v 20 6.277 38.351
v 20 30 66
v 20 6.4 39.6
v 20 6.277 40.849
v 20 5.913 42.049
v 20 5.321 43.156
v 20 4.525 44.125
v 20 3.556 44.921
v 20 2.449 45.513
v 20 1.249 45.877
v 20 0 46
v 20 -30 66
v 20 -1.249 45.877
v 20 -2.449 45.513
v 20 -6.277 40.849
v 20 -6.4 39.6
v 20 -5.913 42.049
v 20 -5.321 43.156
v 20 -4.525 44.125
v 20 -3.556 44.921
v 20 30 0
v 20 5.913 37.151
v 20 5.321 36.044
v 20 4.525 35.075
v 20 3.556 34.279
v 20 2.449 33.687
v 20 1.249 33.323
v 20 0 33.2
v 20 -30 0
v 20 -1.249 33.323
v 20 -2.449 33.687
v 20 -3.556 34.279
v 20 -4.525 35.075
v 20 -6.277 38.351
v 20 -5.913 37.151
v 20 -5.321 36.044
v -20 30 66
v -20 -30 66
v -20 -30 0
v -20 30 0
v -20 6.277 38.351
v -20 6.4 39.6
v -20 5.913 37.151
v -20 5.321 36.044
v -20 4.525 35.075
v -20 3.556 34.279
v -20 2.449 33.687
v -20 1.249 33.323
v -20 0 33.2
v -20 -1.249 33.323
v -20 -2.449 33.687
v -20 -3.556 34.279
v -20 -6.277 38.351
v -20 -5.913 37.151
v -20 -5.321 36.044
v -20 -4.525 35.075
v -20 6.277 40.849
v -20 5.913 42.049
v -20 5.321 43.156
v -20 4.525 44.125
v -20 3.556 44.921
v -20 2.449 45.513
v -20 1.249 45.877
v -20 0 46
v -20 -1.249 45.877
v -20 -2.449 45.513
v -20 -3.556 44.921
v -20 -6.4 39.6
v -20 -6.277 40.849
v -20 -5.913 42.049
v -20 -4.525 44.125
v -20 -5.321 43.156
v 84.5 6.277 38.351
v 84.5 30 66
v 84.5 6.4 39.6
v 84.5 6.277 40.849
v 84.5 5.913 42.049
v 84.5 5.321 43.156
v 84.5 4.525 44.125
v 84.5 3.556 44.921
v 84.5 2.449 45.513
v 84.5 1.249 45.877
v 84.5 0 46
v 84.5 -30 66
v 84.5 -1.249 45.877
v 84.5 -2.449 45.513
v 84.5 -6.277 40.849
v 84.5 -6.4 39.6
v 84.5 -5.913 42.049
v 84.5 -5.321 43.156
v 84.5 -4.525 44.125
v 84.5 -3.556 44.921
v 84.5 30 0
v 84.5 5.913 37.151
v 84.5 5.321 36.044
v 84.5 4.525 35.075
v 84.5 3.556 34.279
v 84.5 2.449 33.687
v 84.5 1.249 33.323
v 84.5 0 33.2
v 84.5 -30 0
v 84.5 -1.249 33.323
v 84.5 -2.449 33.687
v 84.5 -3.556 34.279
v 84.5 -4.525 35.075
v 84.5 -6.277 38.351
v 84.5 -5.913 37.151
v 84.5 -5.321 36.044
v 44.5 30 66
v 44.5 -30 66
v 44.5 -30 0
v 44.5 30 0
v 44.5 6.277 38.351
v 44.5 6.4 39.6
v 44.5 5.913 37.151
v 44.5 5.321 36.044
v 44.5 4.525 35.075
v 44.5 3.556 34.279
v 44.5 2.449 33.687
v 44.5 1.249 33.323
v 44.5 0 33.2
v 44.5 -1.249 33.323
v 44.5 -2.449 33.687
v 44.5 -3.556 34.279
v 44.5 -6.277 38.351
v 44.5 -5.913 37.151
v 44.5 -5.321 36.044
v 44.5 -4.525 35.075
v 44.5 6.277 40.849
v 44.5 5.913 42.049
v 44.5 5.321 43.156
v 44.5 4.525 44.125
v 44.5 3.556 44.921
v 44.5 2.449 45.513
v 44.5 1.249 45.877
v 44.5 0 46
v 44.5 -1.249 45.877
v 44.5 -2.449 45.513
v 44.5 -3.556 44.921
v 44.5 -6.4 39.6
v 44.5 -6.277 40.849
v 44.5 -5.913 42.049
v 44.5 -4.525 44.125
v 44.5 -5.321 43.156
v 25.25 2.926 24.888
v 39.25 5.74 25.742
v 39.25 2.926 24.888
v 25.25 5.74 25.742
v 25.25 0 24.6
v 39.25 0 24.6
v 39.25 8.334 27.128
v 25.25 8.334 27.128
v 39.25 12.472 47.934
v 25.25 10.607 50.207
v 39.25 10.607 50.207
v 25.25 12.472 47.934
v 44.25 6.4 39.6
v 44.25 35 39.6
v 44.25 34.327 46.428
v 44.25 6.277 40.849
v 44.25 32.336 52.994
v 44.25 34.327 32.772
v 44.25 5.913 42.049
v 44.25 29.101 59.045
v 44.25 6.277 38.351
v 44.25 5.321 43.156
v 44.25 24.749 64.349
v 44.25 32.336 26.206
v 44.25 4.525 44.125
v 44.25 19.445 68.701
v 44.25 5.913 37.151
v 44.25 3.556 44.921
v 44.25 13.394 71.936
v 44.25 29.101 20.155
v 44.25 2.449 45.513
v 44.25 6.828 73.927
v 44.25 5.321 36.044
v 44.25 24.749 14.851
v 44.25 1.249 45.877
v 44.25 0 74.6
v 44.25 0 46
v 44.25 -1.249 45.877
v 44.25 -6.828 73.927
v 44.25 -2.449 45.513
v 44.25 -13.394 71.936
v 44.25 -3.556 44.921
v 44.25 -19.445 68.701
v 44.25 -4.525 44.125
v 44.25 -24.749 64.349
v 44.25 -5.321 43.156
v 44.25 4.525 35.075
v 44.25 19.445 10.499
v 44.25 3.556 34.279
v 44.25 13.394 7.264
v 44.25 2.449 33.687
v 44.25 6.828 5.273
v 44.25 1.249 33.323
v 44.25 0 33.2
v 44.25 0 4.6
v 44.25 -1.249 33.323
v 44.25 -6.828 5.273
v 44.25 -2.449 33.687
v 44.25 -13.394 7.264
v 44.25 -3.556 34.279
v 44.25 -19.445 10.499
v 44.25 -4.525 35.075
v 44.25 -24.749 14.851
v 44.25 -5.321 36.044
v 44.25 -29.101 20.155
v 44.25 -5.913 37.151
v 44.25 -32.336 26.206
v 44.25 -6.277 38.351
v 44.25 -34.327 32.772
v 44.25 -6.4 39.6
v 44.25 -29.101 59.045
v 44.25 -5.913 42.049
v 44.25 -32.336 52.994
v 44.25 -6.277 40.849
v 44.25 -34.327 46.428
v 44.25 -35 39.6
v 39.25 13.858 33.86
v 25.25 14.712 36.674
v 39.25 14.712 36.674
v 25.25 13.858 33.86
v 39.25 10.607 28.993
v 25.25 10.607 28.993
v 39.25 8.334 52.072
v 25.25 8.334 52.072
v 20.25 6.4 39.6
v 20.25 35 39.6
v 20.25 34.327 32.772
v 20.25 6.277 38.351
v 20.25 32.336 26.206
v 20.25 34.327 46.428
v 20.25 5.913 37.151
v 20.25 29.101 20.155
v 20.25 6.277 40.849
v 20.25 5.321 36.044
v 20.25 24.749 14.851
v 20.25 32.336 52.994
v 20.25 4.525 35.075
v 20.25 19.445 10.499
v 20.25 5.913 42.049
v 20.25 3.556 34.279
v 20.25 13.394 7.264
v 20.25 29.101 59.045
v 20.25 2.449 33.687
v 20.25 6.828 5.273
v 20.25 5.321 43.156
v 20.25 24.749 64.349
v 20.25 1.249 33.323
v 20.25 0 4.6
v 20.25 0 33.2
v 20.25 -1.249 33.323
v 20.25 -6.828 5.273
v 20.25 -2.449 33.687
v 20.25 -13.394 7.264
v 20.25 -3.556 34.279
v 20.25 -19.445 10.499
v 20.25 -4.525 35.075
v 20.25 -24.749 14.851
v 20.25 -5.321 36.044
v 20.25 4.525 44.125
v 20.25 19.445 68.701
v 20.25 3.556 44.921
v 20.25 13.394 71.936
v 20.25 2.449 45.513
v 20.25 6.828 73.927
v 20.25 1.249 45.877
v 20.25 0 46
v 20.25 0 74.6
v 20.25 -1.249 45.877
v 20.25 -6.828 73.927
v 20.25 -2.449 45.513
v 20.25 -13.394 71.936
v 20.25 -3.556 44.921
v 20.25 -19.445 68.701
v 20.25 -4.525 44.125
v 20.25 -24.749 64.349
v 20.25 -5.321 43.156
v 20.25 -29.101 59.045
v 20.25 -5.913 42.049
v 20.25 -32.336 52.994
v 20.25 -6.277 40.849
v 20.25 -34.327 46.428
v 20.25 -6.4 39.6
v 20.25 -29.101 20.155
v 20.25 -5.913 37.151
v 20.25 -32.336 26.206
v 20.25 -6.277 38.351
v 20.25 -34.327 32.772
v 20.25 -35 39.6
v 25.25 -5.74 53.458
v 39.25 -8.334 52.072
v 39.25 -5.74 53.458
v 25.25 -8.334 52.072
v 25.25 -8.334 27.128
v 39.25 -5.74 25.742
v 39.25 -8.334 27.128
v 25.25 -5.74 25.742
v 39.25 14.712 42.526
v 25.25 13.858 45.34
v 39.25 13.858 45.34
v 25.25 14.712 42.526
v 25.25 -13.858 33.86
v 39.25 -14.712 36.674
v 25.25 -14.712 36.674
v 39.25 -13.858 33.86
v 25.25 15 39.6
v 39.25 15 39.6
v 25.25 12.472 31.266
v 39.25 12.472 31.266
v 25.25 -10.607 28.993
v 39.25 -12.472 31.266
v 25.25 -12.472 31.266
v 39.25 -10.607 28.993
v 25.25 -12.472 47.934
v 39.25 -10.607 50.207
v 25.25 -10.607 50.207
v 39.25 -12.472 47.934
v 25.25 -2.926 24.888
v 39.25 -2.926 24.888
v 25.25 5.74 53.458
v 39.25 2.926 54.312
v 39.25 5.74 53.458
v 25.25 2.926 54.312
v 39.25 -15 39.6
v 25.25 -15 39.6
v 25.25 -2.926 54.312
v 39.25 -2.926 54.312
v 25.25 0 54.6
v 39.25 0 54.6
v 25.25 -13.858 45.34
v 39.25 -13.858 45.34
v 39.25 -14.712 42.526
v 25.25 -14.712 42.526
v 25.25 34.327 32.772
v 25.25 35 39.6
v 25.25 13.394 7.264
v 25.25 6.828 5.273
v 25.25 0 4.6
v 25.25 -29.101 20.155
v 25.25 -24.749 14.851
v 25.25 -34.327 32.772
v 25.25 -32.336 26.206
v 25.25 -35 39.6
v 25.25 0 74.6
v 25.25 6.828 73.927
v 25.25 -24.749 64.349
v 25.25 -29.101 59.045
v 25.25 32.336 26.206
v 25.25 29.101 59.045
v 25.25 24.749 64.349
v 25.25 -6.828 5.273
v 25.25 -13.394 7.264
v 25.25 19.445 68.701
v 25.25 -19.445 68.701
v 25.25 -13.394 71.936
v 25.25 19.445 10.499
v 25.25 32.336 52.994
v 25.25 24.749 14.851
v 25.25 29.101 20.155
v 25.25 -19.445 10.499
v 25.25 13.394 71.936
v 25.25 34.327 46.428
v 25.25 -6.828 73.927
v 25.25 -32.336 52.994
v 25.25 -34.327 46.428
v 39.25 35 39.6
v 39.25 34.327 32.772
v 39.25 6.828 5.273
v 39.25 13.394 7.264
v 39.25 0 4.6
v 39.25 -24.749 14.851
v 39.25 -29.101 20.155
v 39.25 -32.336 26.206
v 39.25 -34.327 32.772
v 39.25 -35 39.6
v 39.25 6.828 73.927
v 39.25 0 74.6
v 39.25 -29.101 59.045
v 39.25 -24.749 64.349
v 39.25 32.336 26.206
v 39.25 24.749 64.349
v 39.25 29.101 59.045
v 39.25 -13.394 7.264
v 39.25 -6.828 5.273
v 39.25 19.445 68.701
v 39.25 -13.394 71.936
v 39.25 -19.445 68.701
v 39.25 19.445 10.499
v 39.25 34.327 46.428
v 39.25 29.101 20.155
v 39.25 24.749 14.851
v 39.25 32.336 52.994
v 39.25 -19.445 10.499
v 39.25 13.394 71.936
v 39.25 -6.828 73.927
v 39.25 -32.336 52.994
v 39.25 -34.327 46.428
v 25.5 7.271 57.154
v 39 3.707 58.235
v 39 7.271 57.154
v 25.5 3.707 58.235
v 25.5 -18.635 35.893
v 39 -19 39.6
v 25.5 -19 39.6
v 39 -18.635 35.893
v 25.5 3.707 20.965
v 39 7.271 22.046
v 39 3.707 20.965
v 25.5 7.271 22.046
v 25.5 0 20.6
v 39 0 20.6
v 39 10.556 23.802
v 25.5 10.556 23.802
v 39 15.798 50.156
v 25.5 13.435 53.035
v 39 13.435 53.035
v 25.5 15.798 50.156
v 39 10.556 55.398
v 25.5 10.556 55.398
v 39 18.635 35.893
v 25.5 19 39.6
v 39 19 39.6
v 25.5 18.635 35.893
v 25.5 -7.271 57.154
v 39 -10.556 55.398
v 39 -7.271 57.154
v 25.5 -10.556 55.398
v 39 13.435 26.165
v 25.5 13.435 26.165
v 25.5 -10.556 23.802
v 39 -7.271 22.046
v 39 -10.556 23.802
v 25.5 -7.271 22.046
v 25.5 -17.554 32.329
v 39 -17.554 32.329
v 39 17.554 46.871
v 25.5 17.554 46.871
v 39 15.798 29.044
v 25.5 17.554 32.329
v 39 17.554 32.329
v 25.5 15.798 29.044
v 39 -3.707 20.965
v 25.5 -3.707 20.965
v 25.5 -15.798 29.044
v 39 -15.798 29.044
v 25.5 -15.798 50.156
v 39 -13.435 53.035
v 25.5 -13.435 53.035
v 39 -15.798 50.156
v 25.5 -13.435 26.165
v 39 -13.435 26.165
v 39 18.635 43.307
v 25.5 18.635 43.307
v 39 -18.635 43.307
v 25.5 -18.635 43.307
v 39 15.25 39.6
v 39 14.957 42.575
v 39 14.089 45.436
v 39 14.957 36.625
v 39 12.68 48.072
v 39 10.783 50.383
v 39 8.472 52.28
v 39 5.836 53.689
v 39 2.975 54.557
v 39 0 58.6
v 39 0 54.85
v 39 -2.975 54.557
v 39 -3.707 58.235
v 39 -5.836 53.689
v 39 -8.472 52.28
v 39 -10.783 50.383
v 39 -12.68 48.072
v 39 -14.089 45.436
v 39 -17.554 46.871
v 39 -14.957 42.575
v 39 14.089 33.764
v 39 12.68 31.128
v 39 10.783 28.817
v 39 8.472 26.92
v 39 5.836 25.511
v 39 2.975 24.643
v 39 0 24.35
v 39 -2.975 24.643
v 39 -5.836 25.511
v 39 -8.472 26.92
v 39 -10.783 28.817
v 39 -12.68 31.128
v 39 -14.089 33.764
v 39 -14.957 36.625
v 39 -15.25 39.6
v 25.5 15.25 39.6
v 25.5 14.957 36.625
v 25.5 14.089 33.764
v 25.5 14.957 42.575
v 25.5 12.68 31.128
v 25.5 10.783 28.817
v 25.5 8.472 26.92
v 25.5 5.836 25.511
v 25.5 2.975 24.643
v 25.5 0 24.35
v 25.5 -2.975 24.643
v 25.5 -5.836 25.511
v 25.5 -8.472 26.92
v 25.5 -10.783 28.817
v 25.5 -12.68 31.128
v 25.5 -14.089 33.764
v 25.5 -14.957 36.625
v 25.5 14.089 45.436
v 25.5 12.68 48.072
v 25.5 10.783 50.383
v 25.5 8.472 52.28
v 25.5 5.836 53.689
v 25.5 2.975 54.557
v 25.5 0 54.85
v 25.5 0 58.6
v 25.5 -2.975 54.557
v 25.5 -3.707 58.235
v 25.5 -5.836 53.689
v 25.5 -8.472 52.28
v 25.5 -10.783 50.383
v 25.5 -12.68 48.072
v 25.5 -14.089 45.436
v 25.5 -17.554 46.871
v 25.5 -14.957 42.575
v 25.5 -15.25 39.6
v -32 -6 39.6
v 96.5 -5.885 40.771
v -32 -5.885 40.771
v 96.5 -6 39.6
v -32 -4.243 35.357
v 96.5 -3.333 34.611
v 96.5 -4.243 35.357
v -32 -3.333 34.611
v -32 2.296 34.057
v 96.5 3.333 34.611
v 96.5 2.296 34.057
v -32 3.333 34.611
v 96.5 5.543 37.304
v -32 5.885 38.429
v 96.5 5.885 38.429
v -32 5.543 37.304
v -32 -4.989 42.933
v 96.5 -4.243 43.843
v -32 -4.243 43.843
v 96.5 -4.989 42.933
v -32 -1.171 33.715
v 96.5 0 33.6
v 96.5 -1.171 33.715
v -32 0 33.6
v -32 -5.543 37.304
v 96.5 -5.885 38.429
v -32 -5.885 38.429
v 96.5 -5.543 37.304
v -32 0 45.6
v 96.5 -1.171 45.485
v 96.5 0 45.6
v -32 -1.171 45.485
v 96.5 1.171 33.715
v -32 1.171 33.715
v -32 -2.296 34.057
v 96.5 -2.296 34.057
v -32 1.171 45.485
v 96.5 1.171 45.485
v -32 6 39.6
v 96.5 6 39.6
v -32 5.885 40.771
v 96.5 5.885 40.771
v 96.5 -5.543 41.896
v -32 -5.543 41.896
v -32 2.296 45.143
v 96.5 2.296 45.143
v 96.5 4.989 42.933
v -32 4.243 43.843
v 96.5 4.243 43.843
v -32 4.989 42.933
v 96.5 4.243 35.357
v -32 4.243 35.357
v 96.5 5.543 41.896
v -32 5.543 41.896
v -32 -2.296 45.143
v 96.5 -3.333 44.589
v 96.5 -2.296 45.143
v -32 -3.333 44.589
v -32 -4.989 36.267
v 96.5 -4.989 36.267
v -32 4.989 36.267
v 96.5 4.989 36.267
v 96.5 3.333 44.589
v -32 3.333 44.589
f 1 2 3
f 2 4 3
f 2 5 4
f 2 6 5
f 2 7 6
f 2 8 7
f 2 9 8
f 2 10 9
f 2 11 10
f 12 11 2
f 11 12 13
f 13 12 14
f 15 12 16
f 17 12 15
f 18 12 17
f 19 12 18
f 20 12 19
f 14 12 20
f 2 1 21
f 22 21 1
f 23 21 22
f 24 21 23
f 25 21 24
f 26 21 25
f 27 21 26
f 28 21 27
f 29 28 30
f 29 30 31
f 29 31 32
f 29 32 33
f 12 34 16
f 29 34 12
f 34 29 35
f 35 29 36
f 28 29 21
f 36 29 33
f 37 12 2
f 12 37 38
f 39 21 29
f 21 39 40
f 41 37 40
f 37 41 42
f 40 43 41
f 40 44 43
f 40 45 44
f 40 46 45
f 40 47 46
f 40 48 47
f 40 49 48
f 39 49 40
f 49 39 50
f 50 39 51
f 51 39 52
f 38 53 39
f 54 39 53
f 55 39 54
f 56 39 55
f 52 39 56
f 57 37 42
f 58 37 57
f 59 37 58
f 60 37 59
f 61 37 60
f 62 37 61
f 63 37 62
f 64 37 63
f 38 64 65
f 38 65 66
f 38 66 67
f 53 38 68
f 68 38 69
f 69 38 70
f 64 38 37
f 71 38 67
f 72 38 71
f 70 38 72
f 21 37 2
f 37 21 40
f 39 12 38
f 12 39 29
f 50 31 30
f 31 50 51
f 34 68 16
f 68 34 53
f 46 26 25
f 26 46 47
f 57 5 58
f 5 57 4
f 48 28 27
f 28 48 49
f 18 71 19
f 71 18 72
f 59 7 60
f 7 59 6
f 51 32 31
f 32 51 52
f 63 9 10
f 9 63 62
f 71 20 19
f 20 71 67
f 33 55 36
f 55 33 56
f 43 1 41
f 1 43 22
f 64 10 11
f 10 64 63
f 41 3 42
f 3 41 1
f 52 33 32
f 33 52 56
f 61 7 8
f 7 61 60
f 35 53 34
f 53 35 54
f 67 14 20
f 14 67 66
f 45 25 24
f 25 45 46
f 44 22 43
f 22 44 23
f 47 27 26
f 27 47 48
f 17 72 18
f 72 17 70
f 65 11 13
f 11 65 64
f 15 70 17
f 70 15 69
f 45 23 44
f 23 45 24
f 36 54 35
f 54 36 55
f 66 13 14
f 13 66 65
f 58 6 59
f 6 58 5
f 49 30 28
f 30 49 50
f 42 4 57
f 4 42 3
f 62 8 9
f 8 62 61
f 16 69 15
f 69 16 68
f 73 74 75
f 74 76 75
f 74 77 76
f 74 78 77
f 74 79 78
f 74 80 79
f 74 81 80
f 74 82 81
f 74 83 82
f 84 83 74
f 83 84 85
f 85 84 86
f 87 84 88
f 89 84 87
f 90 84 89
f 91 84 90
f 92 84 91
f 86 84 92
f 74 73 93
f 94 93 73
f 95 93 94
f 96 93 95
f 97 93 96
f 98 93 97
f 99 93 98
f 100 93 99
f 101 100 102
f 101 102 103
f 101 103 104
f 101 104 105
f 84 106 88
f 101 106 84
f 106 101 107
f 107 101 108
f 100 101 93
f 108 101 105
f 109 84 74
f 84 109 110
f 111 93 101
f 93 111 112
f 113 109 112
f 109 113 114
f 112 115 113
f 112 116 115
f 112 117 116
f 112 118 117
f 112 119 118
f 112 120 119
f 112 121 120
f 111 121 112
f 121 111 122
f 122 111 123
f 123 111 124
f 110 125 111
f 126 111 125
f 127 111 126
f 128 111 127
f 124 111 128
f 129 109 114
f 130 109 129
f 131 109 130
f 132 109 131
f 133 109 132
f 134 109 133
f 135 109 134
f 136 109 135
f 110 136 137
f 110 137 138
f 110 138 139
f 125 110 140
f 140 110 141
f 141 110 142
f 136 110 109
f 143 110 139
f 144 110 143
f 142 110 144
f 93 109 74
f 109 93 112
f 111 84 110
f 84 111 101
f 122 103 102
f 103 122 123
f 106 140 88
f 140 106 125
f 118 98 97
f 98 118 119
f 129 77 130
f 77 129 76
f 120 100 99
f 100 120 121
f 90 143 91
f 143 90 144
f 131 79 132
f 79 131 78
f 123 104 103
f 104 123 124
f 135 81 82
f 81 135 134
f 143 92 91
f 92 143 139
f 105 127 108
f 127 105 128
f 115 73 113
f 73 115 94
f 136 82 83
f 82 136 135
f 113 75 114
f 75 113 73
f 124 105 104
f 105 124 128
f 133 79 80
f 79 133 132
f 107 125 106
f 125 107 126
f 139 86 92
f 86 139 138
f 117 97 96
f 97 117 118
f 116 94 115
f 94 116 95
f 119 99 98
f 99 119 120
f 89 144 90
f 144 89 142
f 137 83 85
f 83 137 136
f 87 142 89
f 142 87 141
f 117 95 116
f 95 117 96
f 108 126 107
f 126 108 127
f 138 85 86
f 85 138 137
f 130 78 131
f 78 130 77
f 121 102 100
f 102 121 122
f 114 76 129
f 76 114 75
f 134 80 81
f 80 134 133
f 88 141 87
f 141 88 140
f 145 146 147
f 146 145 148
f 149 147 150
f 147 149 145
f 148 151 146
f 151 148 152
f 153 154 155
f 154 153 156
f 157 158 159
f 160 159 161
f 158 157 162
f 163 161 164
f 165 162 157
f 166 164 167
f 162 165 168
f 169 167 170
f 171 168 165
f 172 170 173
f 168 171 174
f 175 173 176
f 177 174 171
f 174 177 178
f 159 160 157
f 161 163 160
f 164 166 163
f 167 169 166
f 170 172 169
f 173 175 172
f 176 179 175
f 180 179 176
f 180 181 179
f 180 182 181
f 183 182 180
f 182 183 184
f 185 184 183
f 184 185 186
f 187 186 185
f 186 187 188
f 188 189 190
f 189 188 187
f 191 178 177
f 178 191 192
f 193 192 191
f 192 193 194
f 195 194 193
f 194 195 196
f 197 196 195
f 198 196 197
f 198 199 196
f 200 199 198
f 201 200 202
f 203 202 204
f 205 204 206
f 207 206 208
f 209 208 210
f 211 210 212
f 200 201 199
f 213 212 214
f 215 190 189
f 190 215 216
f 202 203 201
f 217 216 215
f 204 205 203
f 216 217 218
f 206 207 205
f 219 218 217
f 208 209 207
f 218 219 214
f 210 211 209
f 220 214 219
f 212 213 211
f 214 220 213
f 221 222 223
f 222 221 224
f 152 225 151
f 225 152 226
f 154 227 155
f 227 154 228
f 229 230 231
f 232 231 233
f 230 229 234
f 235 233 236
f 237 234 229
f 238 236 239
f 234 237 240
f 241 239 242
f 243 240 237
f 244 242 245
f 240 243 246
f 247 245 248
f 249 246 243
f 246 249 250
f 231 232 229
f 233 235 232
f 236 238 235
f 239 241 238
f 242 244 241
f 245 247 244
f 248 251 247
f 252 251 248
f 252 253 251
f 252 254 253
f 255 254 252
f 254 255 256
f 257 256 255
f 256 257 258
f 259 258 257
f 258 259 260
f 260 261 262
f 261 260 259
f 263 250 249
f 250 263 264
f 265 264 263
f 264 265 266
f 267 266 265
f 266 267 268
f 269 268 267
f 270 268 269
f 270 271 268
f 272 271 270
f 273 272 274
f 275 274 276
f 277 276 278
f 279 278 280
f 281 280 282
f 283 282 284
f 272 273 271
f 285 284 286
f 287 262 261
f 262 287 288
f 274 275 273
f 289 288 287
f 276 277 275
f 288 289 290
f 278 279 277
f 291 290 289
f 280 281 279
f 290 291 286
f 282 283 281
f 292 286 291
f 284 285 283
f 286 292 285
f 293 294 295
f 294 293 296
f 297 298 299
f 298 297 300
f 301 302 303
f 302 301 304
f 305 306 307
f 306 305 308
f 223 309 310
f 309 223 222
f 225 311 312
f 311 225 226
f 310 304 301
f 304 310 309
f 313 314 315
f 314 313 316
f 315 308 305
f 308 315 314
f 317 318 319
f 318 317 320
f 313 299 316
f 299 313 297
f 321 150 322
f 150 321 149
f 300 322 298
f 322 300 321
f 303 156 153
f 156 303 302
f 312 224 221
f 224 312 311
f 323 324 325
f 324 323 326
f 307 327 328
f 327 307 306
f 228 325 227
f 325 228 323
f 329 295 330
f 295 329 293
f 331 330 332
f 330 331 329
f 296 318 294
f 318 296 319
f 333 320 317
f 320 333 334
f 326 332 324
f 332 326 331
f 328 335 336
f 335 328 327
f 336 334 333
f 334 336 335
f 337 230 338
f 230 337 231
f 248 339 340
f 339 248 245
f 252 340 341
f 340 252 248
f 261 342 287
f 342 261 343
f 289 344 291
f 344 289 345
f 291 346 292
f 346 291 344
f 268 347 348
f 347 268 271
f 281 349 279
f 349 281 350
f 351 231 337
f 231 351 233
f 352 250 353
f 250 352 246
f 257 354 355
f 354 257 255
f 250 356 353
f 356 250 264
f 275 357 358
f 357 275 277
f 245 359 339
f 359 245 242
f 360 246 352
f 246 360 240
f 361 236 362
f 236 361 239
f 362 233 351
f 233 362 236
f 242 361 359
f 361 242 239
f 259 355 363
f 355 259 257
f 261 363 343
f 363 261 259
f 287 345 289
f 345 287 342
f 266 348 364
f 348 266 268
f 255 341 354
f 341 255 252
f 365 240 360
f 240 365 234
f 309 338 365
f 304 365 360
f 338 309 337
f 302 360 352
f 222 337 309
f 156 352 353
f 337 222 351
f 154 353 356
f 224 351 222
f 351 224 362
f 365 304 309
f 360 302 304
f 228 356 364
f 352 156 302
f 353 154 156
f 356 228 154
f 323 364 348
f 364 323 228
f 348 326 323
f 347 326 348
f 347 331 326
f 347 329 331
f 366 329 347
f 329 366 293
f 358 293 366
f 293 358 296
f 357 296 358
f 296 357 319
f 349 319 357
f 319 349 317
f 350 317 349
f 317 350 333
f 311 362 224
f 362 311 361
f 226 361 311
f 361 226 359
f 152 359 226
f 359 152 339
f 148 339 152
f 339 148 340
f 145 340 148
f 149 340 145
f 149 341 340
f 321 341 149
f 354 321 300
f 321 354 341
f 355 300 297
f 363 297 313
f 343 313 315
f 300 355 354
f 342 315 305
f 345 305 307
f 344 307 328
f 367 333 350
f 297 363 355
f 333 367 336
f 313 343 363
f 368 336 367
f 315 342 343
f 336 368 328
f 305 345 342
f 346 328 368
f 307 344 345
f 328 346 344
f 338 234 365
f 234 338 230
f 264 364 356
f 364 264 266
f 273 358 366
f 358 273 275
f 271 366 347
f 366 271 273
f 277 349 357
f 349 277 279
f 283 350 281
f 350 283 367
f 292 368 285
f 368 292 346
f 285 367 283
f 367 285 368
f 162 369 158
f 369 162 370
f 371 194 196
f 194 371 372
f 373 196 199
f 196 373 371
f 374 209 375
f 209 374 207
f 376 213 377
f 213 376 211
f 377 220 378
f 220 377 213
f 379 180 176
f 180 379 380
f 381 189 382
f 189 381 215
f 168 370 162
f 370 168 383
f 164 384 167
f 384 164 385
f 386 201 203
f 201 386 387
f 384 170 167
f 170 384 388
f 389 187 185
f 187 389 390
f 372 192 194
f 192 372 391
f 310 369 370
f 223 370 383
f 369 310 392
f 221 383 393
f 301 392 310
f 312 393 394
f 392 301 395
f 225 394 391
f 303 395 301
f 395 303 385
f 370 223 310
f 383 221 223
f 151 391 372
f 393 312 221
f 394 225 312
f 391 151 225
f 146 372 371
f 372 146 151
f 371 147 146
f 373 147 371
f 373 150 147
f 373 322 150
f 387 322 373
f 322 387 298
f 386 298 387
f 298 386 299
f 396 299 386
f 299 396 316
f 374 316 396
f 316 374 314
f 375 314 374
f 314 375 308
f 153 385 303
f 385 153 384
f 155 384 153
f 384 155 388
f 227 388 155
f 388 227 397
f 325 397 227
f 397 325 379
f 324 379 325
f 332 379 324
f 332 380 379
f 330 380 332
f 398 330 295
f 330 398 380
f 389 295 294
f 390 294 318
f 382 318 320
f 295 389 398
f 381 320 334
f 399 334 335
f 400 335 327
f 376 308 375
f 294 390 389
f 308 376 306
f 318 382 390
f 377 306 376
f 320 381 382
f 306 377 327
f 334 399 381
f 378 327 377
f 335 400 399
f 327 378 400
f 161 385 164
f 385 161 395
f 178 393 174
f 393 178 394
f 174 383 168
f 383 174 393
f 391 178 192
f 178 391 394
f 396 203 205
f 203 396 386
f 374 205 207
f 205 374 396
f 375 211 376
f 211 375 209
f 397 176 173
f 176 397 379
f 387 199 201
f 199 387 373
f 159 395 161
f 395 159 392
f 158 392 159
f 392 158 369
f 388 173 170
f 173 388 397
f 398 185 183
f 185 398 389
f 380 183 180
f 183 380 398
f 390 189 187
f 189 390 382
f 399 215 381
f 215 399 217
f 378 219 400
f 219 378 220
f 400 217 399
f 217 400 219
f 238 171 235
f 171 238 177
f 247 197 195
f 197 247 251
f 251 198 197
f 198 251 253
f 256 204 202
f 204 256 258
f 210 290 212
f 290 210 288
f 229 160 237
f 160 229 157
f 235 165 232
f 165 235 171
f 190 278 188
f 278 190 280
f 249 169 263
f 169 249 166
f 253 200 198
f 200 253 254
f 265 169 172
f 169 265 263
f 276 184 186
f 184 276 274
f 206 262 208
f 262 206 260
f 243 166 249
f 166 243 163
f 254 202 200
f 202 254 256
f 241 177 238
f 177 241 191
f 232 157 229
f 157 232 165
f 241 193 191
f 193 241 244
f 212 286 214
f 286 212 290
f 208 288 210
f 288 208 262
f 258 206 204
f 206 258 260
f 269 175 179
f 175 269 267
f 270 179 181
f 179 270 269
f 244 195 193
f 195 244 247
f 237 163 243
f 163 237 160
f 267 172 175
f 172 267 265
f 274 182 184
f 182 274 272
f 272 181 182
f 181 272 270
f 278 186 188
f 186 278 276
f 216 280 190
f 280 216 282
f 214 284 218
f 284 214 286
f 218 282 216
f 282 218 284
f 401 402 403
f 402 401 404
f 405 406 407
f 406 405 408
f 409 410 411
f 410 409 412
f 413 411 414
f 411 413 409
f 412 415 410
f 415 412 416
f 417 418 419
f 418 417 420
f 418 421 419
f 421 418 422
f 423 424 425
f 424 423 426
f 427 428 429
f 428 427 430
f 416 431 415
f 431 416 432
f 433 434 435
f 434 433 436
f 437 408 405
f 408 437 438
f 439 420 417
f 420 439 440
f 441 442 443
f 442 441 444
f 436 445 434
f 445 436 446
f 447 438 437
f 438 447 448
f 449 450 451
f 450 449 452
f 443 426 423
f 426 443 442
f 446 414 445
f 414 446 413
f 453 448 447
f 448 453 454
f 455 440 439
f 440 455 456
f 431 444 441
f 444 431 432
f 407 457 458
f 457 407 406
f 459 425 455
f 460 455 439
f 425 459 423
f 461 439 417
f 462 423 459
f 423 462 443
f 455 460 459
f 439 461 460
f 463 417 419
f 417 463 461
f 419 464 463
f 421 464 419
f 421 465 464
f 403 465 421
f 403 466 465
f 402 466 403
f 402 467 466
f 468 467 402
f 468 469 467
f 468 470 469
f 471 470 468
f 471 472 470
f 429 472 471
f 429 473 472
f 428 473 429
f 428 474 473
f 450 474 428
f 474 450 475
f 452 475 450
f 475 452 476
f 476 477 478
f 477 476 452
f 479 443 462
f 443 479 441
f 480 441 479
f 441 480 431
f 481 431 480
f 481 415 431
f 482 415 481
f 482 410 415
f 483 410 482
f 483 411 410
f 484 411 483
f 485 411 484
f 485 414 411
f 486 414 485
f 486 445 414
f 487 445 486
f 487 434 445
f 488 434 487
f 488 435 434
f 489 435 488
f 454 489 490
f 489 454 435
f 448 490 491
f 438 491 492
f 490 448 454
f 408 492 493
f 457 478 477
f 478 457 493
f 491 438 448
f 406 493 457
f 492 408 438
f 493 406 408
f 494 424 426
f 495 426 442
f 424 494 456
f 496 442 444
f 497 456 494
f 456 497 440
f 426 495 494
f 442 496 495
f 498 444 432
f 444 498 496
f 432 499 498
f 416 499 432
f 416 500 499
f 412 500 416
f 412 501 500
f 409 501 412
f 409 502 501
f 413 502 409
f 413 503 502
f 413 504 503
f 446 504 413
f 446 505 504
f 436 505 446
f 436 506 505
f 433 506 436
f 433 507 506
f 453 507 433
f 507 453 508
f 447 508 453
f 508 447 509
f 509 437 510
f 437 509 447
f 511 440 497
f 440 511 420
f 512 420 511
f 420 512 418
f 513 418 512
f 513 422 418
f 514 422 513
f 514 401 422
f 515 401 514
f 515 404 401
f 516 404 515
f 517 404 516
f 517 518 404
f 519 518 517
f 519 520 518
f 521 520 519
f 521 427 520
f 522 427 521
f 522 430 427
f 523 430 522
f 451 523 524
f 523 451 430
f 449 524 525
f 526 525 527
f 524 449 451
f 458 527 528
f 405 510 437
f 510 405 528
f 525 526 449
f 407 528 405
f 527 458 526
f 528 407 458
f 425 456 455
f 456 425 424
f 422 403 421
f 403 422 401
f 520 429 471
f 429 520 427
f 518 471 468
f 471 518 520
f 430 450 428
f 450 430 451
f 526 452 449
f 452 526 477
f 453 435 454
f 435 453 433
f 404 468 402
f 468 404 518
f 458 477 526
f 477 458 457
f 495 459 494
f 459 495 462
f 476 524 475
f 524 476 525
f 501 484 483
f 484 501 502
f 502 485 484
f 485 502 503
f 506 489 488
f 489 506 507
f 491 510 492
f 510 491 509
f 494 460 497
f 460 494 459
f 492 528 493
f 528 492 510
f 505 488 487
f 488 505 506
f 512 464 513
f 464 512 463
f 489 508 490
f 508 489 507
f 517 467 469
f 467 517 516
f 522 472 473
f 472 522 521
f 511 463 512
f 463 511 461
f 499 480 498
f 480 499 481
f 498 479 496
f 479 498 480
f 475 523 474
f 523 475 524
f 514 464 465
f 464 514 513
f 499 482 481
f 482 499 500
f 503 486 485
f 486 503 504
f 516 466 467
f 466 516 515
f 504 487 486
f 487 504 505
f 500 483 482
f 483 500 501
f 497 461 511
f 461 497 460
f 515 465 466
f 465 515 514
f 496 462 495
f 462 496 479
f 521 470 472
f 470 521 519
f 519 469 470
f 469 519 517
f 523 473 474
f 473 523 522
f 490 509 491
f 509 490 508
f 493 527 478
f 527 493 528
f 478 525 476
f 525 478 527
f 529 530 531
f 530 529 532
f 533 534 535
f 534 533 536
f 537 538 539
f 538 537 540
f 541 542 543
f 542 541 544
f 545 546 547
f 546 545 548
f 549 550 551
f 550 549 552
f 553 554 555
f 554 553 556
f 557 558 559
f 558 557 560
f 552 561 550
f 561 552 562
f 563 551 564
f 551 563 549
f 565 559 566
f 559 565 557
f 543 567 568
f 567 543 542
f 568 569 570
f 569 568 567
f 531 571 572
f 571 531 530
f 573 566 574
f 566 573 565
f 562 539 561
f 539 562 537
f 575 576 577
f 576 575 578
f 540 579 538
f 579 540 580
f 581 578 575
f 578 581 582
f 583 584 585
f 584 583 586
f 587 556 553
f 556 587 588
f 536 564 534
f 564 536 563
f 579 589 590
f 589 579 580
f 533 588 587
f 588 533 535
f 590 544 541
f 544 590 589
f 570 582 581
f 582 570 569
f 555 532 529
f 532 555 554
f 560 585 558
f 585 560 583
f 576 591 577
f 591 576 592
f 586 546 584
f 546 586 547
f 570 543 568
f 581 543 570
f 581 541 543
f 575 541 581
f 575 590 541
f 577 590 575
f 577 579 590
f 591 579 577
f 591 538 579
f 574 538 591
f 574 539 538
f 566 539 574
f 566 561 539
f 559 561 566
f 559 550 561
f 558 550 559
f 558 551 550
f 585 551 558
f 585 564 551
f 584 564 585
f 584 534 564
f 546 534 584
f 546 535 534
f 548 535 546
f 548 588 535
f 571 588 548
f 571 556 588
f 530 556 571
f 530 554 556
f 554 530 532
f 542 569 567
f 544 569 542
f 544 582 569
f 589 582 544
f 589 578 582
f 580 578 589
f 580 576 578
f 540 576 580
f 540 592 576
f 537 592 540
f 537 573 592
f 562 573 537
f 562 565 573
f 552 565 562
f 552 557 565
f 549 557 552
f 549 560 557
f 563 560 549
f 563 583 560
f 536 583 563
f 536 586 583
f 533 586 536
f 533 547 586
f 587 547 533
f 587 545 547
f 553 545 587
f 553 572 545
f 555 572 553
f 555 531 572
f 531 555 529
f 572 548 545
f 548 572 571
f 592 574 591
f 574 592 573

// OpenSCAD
$fn = 32;

// ------------------------------------------------------------------------
// Pulley assembly: d70 pulley with a belt, shaft d12
// Every part is its own module, assembly() places them once.
// ------------------------------------------------------------------------

// --- part 1 ---
module support1() {
  difference() {
    translate([-20, -30, 0]) cube([40, 60, 66]);
    translate([0, 0, 39.6]) rotate([0, 90, 0]) cylinder(h = 42, d = 12.8, center = true);
  }
}

// --- part 2 ---
module support2() {
  difference() {
    translate([-20, -30, 0]) cube([40, 60, 66]);
    translate([0, 0, 39.6]) rotate([0, 90, 0]) cylinder(h = 42, d = 12.8, center = true);
  }
}

// --- part 3 ---
module shaft() {
  translate([0, 0, -64.25]) cylinder(h = 128.5, d = 12);
}

// --- part 4 ---
module pulley() {
  difference() {
    union() {
      cylinder(h = 24, d = 30);
      cylinder(h = 5, d = 70);
      translate([0, 0, 19]) cylinder(h = 5, d = 70);
    }
    translate([0, 0, -1]) cylinder(h = 26, d = 12.8);
  }
}

// --- part 5 ---
module belt() {
  difference() {
      translate([0, 0, 0]) cylinder(h = 13.5, d = 38);
      translate([0, 0, -1]) cylinder(h = 15.5, d = 30.5);
    }
}

// --- assembly ---
module assembly() {
  translate([0, 0, 0]) rotate([0, 0, 0]) support1();
  translate([64.5, 0, 0]) rotate([0, 0, 0]) support2();
  translate([32.25, 0, 39.6]) rotate([0, 90, 0]) shaft();
  translate([20.25, 0, 39.6]) rotate([0, 90, 0]) pulley();
  translate([25.5, 0, 39.6]) rotate([0, 90, 0]) belt();
}

assembly();
